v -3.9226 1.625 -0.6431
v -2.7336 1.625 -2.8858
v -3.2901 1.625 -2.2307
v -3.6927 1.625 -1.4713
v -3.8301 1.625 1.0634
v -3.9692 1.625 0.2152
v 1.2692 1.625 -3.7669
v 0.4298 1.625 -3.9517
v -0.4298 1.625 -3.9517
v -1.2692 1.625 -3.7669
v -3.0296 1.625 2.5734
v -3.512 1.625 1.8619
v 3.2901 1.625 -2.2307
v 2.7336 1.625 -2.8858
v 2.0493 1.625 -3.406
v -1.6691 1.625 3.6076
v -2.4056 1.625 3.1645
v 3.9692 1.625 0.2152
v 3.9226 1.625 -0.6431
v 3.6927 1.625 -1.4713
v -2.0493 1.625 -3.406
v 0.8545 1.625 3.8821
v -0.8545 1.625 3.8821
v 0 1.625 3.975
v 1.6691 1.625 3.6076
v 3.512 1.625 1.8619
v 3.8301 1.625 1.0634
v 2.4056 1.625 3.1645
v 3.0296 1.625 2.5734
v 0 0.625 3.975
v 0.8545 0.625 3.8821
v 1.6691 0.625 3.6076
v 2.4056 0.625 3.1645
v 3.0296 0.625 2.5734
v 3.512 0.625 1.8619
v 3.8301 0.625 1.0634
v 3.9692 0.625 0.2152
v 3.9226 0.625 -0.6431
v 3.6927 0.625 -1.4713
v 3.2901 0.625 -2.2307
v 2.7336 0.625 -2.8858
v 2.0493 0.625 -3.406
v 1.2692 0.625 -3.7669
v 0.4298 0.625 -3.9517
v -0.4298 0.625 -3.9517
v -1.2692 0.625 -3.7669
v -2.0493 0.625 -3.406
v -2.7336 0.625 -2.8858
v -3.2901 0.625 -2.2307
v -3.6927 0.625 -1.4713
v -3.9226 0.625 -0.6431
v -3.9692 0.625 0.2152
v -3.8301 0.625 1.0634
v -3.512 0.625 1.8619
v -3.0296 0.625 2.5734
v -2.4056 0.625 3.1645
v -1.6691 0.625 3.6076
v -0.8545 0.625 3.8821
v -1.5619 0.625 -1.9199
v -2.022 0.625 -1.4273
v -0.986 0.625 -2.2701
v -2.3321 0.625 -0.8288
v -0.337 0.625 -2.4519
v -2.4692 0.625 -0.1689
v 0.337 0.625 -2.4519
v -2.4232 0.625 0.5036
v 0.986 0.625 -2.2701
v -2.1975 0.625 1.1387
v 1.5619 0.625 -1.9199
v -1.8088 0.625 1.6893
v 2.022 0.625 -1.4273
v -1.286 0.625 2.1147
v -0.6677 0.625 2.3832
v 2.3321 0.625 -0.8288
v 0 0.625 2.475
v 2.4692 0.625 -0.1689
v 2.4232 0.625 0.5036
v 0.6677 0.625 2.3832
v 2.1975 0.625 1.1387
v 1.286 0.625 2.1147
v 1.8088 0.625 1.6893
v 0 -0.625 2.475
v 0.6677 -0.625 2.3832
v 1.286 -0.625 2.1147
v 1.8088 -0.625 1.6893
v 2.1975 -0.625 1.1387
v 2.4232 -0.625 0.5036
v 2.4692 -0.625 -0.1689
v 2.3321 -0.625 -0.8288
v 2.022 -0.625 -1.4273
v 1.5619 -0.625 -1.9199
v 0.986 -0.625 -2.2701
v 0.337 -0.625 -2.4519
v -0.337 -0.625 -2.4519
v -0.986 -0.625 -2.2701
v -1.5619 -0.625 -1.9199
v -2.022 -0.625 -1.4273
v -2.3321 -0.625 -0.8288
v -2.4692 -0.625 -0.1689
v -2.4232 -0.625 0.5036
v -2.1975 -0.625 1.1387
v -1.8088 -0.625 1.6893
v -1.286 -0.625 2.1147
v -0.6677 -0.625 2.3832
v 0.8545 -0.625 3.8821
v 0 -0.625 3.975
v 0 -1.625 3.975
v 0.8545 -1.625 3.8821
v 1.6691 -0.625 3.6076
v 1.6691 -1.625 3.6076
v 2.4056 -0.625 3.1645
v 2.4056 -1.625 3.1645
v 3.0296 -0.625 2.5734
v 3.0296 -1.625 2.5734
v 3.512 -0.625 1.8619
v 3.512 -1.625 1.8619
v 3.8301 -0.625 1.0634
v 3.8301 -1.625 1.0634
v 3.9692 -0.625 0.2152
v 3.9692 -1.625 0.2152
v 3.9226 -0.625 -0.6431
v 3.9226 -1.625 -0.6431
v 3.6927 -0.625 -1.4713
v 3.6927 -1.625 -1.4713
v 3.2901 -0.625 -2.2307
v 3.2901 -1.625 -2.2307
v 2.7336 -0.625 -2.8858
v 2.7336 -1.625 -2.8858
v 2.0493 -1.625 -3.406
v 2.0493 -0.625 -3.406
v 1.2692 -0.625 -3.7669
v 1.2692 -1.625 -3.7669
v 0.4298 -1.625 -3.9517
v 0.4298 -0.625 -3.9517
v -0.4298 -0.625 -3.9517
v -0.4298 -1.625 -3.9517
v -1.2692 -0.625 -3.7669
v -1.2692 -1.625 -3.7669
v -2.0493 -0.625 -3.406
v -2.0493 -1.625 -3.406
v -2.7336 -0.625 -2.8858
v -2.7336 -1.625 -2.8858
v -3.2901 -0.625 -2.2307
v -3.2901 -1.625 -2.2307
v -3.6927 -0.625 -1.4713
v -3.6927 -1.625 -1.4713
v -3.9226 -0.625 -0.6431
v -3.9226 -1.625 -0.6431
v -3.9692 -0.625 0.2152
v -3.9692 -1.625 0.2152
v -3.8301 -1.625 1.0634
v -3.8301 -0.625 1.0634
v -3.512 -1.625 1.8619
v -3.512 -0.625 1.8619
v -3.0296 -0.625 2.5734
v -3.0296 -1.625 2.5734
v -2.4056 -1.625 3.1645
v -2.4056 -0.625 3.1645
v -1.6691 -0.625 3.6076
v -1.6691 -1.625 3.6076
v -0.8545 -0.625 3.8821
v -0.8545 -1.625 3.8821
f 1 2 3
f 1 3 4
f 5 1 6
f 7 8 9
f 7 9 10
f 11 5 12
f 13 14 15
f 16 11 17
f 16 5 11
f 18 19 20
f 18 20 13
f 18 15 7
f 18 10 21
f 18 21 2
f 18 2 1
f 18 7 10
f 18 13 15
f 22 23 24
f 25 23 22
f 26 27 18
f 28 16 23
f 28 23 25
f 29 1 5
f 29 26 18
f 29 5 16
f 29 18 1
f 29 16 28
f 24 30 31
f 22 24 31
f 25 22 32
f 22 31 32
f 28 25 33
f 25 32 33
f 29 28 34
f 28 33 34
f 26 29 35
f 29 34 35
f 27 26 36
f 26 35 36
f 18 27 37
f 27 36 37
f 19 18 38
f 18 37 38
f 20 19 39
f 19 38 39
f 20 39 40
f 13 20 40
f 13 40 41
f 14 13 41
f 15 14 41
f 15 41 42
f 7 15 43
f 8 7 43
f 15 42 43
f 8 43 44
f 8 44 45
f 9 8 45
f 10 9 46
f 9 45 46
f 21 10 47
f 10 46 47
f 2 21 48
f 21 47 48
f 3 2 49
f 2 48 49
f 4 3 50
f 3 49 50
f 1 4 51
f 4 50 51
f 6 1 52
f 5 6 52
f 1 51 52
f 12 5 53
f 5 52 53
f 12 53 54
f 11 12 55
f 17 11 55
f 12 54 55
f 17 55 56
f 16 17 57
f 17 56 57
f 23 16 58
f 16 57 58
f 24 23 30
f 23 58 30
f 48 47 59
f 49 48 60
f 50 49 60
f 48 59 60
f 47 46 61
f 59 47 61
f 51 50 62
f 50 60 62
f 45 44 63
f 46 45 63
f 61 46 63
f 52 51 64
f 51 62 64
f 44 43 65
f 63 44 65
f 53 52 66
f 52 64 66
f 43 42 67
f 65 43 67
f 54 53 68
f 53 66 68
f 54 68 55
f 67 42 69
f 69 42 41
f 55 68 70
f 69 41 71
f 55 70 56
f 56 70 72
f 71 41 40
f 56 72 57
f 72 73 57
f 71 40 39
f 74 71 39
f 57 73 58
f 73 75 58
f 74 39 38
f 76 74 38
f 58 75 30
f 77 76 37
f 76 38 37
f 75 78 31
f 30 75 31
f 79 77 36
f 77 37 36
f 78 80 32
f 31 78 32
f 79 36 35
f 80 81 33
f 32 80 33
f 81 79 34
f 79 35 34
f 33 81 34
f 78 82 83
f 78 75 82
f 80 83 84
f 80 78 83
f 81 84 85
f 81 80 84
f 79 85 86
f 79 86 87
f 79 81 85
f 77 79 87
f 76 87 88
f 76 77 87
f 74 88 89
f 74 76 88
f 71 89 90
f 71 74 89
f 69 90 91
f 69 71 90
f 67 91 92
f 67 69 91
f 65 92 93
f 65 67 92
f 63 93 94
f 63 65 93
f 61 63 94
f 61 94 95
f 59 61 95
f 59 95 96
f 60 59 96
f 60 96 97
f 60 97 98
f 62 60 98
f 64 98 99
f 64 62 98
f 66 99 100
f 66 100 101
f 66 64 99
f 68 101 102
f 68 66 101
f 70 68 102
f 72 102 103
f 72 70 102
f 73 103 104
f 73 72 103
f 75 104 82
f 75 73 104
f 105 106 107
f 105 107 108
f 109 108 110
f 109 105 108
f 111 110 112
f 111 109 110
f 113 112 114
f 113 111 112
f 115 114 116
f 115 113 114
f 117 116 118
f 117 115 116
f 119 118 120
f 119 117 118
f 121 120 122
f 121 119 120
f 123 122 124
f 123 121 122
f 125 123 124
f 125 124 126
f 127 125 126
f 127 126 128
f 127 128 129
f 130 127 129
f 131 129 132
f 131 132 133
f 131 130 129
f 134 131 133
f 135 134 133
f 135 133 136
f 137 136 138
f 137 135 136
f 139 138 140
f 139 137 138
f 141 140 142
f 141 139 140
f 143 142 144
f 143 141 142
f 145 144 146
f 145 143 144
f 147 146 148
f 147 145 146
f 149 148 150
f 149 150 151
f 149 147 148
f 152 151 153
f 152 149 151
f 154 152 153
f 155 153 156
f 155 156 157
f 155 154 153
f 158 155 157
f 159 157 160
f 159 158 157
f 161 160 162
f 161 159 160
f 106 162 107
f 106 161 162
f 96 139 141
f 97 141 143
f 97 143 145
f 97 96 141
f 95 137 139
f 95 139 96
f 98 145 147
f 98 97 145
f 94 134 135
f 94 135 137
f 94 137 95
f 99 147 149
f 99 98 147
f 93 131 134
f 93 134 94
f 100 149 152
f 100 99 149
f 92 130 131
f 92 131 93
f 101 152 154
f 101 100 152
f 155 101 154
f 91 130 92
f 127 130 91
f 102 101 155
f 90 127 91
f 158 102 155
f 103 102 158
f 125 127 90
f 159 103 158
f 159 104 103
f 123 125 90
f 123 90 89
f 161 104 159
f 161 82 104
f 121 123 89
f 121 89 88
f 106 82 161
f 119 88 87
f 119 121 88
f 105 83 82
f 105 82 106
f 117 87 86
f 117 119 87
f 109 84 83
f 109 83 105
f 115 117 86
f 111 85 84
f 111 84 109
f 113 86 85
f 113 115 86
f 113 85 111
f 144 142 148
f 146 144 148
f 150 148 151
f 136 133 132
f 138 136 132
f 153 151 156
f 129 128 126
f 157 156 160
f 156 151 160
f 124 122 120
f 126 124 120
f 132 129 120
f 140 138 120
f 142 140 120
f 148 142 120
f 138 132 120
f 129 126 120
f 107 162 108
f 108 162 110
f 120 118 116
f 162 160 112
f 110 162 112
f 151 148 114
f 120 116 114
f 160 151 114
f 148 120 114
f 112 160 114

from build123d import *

# Parameters (mm, degrees)
SKETCH1_R           = 2.475
BOSS_EXTRUDE1_DEPTH = 0.625
SKETCH3_R           = 3.975
BOSS_EXTRUDE2_DEPTH = 1


with BuildPart() as part:
    # Sketch1 → Boss-Extrude1 (new, symmetric)
    with BuildSketch(Plane(origin=(0, 0, 0), x_dir=(1, 0, 0), z_dir=(0, 1, 0))):
        with Locations(Location((0, 0, 0), (0, 0, 270))):
            Circle(SKETCH1_R)
    extrude(amount=BOSS_EXTRUDE1_DEPTH, both=True)

    # Sketch3 → Boss-Extrude2 (add)
    with BuildSketch(Plane(origin=(0, 0.625, 0), x_dir=(1, 0, 0), z_dir=(0, 1, 0))):
        with Locations(Location((0, 0, 0), (0, 0, 270))):
            Circle(SKETCH3_R)
    boss_extrude2 = extrude(amount=BOSS_EXTRUDE2_DEPTH)

    # Mirror1: Boss-Extrude2 across plane
    add(boss_extrude2.mirror(Plane.ZX))


solid = part.part
